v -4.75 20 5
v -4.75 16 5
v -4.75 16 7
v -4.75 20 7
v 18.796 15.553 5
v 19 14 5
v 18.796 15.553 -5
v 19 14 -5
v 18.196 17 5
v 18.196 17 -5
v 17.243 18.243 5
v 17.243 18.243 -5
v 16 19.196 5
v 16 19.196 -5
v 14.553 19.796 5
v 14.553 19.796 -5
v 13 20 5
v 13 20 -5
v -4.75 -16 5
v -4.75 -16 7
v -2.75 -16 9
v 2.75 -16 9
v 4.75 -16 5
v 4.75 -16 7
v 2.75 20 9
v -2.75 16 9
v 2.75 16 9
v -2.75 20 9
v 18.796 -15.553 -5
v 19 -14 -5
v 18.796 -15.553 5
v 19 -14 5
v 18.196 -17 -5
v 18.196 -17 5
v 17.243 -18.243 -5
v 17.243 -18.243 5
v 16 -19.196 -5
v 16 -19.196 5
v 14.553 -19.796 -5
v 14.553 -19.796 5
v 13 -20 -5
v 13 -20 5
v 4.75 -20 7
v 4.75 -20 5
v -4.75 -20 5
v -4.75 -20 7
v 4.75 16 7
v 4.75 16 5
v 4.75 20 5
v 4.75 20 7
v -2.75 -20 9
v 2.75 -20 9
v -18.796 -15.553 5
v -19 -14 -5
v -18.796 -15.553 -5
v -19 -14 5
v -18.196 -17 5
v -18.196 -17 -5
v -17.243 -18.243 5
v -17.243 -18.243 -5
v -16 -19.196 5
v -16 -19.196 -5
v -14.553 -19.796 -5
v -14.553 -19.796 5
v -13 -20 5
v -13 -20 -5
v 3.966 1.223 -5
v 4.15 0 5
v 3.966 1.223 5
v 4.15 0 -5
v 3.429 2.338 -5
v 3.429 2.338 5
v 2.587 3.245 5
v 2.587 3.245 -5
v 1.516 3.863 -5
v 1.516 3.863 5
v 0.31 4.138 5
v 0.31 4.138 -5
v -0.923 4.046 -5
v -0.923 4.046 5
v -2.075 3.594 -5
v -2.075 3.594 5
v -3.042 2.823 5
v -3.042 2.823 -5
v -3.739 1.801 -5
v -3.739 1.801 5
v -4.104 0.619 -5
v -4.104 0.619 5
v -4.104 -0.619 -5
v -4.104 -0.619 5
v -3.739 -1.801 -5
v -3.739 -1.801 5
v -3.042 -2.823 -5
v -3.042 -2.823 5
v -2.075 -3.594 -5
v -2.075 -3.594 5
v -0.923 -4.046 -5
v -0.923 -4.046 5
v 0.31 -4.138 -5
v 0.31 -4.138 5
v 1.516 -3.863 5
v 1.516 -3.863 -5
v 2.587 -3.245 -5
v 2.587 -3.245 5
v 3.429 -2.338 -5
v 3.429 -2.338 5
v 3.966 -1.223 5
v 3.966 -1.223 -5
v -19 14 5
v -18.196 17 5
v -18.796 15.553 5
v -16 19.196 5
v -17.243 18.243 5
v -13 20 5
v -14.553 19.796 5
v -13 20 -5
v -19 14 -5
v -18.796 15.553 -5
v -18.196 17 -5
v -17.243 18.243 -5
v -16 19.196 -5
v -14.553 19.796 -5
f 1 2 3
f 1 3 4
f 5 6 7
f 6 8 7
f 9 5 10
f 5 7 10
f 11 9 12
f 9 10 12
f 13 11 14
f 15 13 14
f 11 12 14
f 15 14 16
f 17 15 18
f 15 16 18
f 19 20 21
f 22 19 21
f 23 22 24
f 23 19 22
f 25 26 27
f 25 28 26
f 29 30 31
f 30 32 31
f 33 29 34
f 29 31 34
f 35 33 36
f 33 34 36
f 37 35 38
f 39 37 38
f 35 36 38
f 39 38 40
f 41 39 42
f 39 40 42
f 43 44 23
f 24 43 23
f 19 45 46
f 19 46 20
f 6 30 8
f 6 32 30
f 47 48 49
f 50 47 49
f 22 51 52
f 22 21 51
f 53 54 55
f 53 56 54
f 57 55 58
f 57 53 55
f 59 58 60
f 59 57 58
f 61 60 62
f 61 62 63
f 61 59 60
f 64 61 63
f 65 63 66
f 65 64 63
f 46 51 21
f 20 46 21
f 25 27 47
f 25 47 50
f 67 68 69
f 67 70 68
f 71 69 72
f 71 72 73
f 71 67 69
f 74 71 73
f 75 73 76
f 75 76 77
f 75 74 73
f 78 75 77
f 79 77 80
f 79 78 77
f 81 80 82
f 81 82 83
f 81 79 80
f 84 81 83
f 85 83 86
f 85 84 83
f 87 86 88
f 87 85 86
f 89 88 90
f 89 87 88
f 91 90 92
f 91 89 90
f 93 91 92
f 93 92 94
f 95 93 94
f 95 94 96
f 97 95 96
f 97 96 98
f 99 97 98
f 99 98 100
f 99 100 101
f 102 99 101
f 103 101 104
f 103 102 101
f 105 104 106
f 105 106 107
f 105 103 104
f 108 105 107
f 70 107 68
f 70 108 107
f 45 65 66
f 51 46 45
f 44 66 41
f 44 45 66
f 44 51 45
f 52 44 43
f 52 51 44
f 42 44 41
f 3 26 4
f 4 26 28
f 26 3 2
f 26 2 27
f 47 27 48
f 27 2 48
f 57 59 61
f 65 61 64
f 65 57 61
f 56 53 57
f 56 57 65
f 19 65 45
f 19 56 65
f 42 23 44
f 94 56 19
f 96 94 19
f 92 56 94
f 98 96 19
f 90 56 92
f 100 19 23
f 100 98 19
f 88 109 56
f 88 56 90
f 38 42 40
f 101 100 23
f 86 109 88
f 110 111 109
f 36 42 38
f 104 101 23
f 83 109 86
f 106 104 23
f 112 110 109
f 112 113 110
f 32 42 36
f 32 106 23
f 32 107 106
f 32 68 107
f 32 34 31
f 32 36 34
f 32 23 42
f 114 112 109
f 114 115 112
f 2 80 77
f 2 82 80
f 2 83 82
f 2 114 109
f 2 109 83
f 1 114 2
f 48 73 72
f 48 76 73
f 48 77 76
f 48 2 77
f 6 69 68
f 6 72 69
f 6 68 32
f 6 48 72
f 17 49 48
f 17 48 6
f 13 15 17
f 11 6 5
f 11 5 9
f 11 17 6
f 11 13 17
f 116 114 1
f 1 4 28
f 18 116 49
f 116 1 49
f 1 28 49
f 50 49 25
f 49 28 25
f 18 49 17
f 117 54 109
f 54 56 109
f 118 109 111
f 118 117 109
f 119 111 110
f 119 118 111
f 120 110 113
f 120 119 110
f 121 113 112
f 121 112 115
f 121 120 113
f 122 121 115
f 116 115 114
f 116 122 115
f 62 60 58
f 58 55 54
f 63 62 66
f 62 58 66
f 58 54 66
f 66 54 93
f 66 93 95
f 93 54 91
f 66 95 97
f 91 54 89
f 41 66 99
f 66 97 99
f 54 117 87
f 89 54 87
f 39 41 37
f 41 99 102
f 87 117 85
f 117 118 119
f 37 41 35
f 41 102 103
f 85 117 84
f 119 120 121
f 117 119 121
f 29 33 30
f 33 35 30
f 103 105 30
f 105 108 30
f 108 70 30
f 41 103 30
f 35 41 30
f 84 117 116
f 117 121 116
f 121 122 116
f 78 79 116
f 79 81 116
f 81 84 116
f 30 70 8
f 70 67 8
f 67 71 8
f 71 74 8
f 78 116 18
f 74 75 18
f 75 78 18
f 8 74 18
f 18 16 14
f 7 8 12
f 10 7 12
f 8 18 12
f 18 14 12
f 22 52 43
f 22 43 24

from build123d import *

# Parameters (mm, degrees)
SKETCH1_W           = 38
SKETCH1_H           = 40
SKETCH1_R           = 4.15
BOSS_EXTRUDE1_DEPTH = 5
FILLET1_R           = 6
SKETCH2_W           = 9.5
SKETCH2_H           = 4
BOSS_EXTRUDE2_DEPTH = 4
CHAMFER1_SIZE       = 2


with BuildPart() as part:
    # Sketch1 → Boss-Extrude1 (new body, symmetric)
    with BuildSketch(Plane.XY):
        Rectangle(SKETCH1_W, SKETCH1_H)
        Circle(SKETCH1_R, mode=Mode.SUBTRACT)
    extrude(amount=BOSS_EXTRUDE1_DEPTH, both=True)

    # Fillet1
    fillet1_edges = [part.edges().sort_by_distance(p)[0] for p in [
        (19, -20, 0),
        (-19, -20, 0),
        (-19, 20, 0),
        (19, 20, 0),
    ]]
    fillet(fillet1_edges, radius=FILLET1_R)

    # Sketch2 → Boss-Extrude2 (add)
    with BuildSketch(Plane.XY.offset(5)):
        with Locations((0, 18)):
            Rectangle(SKETCH2_W, SKETCH2_H)
        with Locations((0, -18)):
            Rectangle(SKETCH2_W, SKETCH2_H)
    extrude(amount=BOSS_EXTRUDE2_DEPTH)

    # Chamfer1
    chamfer1_edges = [part.edges().sort_by_distance(p)[0] for p in [
        (4.75, 18, 9),
        (-4.75, 18, 9),
        (-4.75, -18, 9),
        (4.75, -18, 9),
    ]]
    chamfer(chamfer1_edges, length=CHAMFER1_SIZE)


solid = part.part
